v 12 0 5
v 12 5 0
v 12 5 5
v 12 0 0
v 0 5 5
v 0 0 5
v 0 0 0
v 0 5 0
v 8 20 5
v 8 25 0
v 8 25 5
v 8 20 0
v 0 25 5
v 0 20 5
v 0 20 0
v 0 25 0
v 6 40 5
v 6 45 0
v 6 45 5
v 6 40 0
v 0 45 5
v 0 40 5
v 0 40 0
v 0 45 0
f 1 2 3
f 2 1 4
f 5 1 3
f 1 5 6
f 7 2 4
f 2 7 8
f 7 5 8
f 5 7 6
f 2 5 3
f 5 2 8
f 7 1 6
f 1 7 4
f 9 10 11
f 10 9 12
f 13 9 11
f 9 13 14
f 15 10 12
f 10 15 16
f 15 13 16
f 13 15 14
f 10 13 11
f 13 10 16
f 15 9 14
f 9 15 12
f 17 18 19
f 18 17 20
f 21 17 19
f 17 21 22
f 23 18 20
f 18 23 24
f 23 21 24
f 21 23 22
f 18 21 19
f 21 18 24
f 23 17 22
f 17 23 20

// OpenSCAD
// `is_undef()` and the `||` short-circuit — the two halves of the single most
// common idiom in the files this company actually cuts, and the corpus had
// neither.
//
// WHY IT WAS CHOSEN, WITH THE COUNT AND ITS DENOMINATOR. `is_undef` appears in
// **100 of the 246 non-archive `.scad` files** under `hardware/cad/`, and in
// **27 of the 68** that `--hardware` actually covers (32 sites, every one of them
// passing a bare name). The corpus called it **zero** times. Both forms below are
// the ones those files write:
//   · `X = is_undef(X) ? <default> : X;`      — the parameter-default idiom
//   · `if (is_undef(_flag) || <read _flag>)`  — the library-guard idiom, which
//     decides whether a library file draws itself when opened alone
//
// WHAT IT WOULD CATCH. Two independent mechanisms, each of which has already
// been wrong here:
//   1. `is_undef(<bare name>)` is a SPECIAL FORM: it asks the ENVIRONMENT
//      whether the name is bound and never evaluates it. An unbound name
//      evaluates to the poison value `FAILED` in this evaluator (deliberately —
//      it is what stops a refused expression being absorbed as an omitted
//      argument), so a predicate that simply evaluated its argument would refuse
//      the whole line. The self-referential first line is exactly that case.
//   2. `||` SHORT-CIRCUITS, and it is not an optimisation. Both operands used to
//      be evaluated, so the guard idiom reported an undefined variable, poisoned
//      the condition, and the `if` was refused — a library file that draws
//      itself when opened alone drew NOTHING, for a name the source is
//      deliberately asking about rather than reading.
//
// 🔴 THE THIRD SOLID IS A CONTROL AND MUST NOT BE DELETED. Without it, a
// regression that refuses BOTH constructs leaves the file emitting nothing at
// all, which scores `REFUSED` — a verdict `CAD1` treats as safe. An
// unconditional solid means any partial loss is compared and scores `DIVERGES`
// or `ERROR` instead. A refusal that keeps geometry is not a refusal, and this
// case is built so the harness gets to say so.
//
// Decidability: 40 mm apart in y, footprints at most 12 x 5 mm.
//
// PLANTED AND WATCHED RED (throwaway copy, openscad 2026.08.07):
//   · the `is_undef` special form removed (argument evaluated) -> ERROR
//   · `||` evaluating both operands                            -> ERROR
depth = is_undef(depth) ? 12 : 3;
cube([depth, 5, 5]);
translate([0, 20, 0]) if (is_undef(alsonone) || alsonone) cube([8, 5, 5]);
translate([0, 40, 0]) cube([6, 5, 5]);
